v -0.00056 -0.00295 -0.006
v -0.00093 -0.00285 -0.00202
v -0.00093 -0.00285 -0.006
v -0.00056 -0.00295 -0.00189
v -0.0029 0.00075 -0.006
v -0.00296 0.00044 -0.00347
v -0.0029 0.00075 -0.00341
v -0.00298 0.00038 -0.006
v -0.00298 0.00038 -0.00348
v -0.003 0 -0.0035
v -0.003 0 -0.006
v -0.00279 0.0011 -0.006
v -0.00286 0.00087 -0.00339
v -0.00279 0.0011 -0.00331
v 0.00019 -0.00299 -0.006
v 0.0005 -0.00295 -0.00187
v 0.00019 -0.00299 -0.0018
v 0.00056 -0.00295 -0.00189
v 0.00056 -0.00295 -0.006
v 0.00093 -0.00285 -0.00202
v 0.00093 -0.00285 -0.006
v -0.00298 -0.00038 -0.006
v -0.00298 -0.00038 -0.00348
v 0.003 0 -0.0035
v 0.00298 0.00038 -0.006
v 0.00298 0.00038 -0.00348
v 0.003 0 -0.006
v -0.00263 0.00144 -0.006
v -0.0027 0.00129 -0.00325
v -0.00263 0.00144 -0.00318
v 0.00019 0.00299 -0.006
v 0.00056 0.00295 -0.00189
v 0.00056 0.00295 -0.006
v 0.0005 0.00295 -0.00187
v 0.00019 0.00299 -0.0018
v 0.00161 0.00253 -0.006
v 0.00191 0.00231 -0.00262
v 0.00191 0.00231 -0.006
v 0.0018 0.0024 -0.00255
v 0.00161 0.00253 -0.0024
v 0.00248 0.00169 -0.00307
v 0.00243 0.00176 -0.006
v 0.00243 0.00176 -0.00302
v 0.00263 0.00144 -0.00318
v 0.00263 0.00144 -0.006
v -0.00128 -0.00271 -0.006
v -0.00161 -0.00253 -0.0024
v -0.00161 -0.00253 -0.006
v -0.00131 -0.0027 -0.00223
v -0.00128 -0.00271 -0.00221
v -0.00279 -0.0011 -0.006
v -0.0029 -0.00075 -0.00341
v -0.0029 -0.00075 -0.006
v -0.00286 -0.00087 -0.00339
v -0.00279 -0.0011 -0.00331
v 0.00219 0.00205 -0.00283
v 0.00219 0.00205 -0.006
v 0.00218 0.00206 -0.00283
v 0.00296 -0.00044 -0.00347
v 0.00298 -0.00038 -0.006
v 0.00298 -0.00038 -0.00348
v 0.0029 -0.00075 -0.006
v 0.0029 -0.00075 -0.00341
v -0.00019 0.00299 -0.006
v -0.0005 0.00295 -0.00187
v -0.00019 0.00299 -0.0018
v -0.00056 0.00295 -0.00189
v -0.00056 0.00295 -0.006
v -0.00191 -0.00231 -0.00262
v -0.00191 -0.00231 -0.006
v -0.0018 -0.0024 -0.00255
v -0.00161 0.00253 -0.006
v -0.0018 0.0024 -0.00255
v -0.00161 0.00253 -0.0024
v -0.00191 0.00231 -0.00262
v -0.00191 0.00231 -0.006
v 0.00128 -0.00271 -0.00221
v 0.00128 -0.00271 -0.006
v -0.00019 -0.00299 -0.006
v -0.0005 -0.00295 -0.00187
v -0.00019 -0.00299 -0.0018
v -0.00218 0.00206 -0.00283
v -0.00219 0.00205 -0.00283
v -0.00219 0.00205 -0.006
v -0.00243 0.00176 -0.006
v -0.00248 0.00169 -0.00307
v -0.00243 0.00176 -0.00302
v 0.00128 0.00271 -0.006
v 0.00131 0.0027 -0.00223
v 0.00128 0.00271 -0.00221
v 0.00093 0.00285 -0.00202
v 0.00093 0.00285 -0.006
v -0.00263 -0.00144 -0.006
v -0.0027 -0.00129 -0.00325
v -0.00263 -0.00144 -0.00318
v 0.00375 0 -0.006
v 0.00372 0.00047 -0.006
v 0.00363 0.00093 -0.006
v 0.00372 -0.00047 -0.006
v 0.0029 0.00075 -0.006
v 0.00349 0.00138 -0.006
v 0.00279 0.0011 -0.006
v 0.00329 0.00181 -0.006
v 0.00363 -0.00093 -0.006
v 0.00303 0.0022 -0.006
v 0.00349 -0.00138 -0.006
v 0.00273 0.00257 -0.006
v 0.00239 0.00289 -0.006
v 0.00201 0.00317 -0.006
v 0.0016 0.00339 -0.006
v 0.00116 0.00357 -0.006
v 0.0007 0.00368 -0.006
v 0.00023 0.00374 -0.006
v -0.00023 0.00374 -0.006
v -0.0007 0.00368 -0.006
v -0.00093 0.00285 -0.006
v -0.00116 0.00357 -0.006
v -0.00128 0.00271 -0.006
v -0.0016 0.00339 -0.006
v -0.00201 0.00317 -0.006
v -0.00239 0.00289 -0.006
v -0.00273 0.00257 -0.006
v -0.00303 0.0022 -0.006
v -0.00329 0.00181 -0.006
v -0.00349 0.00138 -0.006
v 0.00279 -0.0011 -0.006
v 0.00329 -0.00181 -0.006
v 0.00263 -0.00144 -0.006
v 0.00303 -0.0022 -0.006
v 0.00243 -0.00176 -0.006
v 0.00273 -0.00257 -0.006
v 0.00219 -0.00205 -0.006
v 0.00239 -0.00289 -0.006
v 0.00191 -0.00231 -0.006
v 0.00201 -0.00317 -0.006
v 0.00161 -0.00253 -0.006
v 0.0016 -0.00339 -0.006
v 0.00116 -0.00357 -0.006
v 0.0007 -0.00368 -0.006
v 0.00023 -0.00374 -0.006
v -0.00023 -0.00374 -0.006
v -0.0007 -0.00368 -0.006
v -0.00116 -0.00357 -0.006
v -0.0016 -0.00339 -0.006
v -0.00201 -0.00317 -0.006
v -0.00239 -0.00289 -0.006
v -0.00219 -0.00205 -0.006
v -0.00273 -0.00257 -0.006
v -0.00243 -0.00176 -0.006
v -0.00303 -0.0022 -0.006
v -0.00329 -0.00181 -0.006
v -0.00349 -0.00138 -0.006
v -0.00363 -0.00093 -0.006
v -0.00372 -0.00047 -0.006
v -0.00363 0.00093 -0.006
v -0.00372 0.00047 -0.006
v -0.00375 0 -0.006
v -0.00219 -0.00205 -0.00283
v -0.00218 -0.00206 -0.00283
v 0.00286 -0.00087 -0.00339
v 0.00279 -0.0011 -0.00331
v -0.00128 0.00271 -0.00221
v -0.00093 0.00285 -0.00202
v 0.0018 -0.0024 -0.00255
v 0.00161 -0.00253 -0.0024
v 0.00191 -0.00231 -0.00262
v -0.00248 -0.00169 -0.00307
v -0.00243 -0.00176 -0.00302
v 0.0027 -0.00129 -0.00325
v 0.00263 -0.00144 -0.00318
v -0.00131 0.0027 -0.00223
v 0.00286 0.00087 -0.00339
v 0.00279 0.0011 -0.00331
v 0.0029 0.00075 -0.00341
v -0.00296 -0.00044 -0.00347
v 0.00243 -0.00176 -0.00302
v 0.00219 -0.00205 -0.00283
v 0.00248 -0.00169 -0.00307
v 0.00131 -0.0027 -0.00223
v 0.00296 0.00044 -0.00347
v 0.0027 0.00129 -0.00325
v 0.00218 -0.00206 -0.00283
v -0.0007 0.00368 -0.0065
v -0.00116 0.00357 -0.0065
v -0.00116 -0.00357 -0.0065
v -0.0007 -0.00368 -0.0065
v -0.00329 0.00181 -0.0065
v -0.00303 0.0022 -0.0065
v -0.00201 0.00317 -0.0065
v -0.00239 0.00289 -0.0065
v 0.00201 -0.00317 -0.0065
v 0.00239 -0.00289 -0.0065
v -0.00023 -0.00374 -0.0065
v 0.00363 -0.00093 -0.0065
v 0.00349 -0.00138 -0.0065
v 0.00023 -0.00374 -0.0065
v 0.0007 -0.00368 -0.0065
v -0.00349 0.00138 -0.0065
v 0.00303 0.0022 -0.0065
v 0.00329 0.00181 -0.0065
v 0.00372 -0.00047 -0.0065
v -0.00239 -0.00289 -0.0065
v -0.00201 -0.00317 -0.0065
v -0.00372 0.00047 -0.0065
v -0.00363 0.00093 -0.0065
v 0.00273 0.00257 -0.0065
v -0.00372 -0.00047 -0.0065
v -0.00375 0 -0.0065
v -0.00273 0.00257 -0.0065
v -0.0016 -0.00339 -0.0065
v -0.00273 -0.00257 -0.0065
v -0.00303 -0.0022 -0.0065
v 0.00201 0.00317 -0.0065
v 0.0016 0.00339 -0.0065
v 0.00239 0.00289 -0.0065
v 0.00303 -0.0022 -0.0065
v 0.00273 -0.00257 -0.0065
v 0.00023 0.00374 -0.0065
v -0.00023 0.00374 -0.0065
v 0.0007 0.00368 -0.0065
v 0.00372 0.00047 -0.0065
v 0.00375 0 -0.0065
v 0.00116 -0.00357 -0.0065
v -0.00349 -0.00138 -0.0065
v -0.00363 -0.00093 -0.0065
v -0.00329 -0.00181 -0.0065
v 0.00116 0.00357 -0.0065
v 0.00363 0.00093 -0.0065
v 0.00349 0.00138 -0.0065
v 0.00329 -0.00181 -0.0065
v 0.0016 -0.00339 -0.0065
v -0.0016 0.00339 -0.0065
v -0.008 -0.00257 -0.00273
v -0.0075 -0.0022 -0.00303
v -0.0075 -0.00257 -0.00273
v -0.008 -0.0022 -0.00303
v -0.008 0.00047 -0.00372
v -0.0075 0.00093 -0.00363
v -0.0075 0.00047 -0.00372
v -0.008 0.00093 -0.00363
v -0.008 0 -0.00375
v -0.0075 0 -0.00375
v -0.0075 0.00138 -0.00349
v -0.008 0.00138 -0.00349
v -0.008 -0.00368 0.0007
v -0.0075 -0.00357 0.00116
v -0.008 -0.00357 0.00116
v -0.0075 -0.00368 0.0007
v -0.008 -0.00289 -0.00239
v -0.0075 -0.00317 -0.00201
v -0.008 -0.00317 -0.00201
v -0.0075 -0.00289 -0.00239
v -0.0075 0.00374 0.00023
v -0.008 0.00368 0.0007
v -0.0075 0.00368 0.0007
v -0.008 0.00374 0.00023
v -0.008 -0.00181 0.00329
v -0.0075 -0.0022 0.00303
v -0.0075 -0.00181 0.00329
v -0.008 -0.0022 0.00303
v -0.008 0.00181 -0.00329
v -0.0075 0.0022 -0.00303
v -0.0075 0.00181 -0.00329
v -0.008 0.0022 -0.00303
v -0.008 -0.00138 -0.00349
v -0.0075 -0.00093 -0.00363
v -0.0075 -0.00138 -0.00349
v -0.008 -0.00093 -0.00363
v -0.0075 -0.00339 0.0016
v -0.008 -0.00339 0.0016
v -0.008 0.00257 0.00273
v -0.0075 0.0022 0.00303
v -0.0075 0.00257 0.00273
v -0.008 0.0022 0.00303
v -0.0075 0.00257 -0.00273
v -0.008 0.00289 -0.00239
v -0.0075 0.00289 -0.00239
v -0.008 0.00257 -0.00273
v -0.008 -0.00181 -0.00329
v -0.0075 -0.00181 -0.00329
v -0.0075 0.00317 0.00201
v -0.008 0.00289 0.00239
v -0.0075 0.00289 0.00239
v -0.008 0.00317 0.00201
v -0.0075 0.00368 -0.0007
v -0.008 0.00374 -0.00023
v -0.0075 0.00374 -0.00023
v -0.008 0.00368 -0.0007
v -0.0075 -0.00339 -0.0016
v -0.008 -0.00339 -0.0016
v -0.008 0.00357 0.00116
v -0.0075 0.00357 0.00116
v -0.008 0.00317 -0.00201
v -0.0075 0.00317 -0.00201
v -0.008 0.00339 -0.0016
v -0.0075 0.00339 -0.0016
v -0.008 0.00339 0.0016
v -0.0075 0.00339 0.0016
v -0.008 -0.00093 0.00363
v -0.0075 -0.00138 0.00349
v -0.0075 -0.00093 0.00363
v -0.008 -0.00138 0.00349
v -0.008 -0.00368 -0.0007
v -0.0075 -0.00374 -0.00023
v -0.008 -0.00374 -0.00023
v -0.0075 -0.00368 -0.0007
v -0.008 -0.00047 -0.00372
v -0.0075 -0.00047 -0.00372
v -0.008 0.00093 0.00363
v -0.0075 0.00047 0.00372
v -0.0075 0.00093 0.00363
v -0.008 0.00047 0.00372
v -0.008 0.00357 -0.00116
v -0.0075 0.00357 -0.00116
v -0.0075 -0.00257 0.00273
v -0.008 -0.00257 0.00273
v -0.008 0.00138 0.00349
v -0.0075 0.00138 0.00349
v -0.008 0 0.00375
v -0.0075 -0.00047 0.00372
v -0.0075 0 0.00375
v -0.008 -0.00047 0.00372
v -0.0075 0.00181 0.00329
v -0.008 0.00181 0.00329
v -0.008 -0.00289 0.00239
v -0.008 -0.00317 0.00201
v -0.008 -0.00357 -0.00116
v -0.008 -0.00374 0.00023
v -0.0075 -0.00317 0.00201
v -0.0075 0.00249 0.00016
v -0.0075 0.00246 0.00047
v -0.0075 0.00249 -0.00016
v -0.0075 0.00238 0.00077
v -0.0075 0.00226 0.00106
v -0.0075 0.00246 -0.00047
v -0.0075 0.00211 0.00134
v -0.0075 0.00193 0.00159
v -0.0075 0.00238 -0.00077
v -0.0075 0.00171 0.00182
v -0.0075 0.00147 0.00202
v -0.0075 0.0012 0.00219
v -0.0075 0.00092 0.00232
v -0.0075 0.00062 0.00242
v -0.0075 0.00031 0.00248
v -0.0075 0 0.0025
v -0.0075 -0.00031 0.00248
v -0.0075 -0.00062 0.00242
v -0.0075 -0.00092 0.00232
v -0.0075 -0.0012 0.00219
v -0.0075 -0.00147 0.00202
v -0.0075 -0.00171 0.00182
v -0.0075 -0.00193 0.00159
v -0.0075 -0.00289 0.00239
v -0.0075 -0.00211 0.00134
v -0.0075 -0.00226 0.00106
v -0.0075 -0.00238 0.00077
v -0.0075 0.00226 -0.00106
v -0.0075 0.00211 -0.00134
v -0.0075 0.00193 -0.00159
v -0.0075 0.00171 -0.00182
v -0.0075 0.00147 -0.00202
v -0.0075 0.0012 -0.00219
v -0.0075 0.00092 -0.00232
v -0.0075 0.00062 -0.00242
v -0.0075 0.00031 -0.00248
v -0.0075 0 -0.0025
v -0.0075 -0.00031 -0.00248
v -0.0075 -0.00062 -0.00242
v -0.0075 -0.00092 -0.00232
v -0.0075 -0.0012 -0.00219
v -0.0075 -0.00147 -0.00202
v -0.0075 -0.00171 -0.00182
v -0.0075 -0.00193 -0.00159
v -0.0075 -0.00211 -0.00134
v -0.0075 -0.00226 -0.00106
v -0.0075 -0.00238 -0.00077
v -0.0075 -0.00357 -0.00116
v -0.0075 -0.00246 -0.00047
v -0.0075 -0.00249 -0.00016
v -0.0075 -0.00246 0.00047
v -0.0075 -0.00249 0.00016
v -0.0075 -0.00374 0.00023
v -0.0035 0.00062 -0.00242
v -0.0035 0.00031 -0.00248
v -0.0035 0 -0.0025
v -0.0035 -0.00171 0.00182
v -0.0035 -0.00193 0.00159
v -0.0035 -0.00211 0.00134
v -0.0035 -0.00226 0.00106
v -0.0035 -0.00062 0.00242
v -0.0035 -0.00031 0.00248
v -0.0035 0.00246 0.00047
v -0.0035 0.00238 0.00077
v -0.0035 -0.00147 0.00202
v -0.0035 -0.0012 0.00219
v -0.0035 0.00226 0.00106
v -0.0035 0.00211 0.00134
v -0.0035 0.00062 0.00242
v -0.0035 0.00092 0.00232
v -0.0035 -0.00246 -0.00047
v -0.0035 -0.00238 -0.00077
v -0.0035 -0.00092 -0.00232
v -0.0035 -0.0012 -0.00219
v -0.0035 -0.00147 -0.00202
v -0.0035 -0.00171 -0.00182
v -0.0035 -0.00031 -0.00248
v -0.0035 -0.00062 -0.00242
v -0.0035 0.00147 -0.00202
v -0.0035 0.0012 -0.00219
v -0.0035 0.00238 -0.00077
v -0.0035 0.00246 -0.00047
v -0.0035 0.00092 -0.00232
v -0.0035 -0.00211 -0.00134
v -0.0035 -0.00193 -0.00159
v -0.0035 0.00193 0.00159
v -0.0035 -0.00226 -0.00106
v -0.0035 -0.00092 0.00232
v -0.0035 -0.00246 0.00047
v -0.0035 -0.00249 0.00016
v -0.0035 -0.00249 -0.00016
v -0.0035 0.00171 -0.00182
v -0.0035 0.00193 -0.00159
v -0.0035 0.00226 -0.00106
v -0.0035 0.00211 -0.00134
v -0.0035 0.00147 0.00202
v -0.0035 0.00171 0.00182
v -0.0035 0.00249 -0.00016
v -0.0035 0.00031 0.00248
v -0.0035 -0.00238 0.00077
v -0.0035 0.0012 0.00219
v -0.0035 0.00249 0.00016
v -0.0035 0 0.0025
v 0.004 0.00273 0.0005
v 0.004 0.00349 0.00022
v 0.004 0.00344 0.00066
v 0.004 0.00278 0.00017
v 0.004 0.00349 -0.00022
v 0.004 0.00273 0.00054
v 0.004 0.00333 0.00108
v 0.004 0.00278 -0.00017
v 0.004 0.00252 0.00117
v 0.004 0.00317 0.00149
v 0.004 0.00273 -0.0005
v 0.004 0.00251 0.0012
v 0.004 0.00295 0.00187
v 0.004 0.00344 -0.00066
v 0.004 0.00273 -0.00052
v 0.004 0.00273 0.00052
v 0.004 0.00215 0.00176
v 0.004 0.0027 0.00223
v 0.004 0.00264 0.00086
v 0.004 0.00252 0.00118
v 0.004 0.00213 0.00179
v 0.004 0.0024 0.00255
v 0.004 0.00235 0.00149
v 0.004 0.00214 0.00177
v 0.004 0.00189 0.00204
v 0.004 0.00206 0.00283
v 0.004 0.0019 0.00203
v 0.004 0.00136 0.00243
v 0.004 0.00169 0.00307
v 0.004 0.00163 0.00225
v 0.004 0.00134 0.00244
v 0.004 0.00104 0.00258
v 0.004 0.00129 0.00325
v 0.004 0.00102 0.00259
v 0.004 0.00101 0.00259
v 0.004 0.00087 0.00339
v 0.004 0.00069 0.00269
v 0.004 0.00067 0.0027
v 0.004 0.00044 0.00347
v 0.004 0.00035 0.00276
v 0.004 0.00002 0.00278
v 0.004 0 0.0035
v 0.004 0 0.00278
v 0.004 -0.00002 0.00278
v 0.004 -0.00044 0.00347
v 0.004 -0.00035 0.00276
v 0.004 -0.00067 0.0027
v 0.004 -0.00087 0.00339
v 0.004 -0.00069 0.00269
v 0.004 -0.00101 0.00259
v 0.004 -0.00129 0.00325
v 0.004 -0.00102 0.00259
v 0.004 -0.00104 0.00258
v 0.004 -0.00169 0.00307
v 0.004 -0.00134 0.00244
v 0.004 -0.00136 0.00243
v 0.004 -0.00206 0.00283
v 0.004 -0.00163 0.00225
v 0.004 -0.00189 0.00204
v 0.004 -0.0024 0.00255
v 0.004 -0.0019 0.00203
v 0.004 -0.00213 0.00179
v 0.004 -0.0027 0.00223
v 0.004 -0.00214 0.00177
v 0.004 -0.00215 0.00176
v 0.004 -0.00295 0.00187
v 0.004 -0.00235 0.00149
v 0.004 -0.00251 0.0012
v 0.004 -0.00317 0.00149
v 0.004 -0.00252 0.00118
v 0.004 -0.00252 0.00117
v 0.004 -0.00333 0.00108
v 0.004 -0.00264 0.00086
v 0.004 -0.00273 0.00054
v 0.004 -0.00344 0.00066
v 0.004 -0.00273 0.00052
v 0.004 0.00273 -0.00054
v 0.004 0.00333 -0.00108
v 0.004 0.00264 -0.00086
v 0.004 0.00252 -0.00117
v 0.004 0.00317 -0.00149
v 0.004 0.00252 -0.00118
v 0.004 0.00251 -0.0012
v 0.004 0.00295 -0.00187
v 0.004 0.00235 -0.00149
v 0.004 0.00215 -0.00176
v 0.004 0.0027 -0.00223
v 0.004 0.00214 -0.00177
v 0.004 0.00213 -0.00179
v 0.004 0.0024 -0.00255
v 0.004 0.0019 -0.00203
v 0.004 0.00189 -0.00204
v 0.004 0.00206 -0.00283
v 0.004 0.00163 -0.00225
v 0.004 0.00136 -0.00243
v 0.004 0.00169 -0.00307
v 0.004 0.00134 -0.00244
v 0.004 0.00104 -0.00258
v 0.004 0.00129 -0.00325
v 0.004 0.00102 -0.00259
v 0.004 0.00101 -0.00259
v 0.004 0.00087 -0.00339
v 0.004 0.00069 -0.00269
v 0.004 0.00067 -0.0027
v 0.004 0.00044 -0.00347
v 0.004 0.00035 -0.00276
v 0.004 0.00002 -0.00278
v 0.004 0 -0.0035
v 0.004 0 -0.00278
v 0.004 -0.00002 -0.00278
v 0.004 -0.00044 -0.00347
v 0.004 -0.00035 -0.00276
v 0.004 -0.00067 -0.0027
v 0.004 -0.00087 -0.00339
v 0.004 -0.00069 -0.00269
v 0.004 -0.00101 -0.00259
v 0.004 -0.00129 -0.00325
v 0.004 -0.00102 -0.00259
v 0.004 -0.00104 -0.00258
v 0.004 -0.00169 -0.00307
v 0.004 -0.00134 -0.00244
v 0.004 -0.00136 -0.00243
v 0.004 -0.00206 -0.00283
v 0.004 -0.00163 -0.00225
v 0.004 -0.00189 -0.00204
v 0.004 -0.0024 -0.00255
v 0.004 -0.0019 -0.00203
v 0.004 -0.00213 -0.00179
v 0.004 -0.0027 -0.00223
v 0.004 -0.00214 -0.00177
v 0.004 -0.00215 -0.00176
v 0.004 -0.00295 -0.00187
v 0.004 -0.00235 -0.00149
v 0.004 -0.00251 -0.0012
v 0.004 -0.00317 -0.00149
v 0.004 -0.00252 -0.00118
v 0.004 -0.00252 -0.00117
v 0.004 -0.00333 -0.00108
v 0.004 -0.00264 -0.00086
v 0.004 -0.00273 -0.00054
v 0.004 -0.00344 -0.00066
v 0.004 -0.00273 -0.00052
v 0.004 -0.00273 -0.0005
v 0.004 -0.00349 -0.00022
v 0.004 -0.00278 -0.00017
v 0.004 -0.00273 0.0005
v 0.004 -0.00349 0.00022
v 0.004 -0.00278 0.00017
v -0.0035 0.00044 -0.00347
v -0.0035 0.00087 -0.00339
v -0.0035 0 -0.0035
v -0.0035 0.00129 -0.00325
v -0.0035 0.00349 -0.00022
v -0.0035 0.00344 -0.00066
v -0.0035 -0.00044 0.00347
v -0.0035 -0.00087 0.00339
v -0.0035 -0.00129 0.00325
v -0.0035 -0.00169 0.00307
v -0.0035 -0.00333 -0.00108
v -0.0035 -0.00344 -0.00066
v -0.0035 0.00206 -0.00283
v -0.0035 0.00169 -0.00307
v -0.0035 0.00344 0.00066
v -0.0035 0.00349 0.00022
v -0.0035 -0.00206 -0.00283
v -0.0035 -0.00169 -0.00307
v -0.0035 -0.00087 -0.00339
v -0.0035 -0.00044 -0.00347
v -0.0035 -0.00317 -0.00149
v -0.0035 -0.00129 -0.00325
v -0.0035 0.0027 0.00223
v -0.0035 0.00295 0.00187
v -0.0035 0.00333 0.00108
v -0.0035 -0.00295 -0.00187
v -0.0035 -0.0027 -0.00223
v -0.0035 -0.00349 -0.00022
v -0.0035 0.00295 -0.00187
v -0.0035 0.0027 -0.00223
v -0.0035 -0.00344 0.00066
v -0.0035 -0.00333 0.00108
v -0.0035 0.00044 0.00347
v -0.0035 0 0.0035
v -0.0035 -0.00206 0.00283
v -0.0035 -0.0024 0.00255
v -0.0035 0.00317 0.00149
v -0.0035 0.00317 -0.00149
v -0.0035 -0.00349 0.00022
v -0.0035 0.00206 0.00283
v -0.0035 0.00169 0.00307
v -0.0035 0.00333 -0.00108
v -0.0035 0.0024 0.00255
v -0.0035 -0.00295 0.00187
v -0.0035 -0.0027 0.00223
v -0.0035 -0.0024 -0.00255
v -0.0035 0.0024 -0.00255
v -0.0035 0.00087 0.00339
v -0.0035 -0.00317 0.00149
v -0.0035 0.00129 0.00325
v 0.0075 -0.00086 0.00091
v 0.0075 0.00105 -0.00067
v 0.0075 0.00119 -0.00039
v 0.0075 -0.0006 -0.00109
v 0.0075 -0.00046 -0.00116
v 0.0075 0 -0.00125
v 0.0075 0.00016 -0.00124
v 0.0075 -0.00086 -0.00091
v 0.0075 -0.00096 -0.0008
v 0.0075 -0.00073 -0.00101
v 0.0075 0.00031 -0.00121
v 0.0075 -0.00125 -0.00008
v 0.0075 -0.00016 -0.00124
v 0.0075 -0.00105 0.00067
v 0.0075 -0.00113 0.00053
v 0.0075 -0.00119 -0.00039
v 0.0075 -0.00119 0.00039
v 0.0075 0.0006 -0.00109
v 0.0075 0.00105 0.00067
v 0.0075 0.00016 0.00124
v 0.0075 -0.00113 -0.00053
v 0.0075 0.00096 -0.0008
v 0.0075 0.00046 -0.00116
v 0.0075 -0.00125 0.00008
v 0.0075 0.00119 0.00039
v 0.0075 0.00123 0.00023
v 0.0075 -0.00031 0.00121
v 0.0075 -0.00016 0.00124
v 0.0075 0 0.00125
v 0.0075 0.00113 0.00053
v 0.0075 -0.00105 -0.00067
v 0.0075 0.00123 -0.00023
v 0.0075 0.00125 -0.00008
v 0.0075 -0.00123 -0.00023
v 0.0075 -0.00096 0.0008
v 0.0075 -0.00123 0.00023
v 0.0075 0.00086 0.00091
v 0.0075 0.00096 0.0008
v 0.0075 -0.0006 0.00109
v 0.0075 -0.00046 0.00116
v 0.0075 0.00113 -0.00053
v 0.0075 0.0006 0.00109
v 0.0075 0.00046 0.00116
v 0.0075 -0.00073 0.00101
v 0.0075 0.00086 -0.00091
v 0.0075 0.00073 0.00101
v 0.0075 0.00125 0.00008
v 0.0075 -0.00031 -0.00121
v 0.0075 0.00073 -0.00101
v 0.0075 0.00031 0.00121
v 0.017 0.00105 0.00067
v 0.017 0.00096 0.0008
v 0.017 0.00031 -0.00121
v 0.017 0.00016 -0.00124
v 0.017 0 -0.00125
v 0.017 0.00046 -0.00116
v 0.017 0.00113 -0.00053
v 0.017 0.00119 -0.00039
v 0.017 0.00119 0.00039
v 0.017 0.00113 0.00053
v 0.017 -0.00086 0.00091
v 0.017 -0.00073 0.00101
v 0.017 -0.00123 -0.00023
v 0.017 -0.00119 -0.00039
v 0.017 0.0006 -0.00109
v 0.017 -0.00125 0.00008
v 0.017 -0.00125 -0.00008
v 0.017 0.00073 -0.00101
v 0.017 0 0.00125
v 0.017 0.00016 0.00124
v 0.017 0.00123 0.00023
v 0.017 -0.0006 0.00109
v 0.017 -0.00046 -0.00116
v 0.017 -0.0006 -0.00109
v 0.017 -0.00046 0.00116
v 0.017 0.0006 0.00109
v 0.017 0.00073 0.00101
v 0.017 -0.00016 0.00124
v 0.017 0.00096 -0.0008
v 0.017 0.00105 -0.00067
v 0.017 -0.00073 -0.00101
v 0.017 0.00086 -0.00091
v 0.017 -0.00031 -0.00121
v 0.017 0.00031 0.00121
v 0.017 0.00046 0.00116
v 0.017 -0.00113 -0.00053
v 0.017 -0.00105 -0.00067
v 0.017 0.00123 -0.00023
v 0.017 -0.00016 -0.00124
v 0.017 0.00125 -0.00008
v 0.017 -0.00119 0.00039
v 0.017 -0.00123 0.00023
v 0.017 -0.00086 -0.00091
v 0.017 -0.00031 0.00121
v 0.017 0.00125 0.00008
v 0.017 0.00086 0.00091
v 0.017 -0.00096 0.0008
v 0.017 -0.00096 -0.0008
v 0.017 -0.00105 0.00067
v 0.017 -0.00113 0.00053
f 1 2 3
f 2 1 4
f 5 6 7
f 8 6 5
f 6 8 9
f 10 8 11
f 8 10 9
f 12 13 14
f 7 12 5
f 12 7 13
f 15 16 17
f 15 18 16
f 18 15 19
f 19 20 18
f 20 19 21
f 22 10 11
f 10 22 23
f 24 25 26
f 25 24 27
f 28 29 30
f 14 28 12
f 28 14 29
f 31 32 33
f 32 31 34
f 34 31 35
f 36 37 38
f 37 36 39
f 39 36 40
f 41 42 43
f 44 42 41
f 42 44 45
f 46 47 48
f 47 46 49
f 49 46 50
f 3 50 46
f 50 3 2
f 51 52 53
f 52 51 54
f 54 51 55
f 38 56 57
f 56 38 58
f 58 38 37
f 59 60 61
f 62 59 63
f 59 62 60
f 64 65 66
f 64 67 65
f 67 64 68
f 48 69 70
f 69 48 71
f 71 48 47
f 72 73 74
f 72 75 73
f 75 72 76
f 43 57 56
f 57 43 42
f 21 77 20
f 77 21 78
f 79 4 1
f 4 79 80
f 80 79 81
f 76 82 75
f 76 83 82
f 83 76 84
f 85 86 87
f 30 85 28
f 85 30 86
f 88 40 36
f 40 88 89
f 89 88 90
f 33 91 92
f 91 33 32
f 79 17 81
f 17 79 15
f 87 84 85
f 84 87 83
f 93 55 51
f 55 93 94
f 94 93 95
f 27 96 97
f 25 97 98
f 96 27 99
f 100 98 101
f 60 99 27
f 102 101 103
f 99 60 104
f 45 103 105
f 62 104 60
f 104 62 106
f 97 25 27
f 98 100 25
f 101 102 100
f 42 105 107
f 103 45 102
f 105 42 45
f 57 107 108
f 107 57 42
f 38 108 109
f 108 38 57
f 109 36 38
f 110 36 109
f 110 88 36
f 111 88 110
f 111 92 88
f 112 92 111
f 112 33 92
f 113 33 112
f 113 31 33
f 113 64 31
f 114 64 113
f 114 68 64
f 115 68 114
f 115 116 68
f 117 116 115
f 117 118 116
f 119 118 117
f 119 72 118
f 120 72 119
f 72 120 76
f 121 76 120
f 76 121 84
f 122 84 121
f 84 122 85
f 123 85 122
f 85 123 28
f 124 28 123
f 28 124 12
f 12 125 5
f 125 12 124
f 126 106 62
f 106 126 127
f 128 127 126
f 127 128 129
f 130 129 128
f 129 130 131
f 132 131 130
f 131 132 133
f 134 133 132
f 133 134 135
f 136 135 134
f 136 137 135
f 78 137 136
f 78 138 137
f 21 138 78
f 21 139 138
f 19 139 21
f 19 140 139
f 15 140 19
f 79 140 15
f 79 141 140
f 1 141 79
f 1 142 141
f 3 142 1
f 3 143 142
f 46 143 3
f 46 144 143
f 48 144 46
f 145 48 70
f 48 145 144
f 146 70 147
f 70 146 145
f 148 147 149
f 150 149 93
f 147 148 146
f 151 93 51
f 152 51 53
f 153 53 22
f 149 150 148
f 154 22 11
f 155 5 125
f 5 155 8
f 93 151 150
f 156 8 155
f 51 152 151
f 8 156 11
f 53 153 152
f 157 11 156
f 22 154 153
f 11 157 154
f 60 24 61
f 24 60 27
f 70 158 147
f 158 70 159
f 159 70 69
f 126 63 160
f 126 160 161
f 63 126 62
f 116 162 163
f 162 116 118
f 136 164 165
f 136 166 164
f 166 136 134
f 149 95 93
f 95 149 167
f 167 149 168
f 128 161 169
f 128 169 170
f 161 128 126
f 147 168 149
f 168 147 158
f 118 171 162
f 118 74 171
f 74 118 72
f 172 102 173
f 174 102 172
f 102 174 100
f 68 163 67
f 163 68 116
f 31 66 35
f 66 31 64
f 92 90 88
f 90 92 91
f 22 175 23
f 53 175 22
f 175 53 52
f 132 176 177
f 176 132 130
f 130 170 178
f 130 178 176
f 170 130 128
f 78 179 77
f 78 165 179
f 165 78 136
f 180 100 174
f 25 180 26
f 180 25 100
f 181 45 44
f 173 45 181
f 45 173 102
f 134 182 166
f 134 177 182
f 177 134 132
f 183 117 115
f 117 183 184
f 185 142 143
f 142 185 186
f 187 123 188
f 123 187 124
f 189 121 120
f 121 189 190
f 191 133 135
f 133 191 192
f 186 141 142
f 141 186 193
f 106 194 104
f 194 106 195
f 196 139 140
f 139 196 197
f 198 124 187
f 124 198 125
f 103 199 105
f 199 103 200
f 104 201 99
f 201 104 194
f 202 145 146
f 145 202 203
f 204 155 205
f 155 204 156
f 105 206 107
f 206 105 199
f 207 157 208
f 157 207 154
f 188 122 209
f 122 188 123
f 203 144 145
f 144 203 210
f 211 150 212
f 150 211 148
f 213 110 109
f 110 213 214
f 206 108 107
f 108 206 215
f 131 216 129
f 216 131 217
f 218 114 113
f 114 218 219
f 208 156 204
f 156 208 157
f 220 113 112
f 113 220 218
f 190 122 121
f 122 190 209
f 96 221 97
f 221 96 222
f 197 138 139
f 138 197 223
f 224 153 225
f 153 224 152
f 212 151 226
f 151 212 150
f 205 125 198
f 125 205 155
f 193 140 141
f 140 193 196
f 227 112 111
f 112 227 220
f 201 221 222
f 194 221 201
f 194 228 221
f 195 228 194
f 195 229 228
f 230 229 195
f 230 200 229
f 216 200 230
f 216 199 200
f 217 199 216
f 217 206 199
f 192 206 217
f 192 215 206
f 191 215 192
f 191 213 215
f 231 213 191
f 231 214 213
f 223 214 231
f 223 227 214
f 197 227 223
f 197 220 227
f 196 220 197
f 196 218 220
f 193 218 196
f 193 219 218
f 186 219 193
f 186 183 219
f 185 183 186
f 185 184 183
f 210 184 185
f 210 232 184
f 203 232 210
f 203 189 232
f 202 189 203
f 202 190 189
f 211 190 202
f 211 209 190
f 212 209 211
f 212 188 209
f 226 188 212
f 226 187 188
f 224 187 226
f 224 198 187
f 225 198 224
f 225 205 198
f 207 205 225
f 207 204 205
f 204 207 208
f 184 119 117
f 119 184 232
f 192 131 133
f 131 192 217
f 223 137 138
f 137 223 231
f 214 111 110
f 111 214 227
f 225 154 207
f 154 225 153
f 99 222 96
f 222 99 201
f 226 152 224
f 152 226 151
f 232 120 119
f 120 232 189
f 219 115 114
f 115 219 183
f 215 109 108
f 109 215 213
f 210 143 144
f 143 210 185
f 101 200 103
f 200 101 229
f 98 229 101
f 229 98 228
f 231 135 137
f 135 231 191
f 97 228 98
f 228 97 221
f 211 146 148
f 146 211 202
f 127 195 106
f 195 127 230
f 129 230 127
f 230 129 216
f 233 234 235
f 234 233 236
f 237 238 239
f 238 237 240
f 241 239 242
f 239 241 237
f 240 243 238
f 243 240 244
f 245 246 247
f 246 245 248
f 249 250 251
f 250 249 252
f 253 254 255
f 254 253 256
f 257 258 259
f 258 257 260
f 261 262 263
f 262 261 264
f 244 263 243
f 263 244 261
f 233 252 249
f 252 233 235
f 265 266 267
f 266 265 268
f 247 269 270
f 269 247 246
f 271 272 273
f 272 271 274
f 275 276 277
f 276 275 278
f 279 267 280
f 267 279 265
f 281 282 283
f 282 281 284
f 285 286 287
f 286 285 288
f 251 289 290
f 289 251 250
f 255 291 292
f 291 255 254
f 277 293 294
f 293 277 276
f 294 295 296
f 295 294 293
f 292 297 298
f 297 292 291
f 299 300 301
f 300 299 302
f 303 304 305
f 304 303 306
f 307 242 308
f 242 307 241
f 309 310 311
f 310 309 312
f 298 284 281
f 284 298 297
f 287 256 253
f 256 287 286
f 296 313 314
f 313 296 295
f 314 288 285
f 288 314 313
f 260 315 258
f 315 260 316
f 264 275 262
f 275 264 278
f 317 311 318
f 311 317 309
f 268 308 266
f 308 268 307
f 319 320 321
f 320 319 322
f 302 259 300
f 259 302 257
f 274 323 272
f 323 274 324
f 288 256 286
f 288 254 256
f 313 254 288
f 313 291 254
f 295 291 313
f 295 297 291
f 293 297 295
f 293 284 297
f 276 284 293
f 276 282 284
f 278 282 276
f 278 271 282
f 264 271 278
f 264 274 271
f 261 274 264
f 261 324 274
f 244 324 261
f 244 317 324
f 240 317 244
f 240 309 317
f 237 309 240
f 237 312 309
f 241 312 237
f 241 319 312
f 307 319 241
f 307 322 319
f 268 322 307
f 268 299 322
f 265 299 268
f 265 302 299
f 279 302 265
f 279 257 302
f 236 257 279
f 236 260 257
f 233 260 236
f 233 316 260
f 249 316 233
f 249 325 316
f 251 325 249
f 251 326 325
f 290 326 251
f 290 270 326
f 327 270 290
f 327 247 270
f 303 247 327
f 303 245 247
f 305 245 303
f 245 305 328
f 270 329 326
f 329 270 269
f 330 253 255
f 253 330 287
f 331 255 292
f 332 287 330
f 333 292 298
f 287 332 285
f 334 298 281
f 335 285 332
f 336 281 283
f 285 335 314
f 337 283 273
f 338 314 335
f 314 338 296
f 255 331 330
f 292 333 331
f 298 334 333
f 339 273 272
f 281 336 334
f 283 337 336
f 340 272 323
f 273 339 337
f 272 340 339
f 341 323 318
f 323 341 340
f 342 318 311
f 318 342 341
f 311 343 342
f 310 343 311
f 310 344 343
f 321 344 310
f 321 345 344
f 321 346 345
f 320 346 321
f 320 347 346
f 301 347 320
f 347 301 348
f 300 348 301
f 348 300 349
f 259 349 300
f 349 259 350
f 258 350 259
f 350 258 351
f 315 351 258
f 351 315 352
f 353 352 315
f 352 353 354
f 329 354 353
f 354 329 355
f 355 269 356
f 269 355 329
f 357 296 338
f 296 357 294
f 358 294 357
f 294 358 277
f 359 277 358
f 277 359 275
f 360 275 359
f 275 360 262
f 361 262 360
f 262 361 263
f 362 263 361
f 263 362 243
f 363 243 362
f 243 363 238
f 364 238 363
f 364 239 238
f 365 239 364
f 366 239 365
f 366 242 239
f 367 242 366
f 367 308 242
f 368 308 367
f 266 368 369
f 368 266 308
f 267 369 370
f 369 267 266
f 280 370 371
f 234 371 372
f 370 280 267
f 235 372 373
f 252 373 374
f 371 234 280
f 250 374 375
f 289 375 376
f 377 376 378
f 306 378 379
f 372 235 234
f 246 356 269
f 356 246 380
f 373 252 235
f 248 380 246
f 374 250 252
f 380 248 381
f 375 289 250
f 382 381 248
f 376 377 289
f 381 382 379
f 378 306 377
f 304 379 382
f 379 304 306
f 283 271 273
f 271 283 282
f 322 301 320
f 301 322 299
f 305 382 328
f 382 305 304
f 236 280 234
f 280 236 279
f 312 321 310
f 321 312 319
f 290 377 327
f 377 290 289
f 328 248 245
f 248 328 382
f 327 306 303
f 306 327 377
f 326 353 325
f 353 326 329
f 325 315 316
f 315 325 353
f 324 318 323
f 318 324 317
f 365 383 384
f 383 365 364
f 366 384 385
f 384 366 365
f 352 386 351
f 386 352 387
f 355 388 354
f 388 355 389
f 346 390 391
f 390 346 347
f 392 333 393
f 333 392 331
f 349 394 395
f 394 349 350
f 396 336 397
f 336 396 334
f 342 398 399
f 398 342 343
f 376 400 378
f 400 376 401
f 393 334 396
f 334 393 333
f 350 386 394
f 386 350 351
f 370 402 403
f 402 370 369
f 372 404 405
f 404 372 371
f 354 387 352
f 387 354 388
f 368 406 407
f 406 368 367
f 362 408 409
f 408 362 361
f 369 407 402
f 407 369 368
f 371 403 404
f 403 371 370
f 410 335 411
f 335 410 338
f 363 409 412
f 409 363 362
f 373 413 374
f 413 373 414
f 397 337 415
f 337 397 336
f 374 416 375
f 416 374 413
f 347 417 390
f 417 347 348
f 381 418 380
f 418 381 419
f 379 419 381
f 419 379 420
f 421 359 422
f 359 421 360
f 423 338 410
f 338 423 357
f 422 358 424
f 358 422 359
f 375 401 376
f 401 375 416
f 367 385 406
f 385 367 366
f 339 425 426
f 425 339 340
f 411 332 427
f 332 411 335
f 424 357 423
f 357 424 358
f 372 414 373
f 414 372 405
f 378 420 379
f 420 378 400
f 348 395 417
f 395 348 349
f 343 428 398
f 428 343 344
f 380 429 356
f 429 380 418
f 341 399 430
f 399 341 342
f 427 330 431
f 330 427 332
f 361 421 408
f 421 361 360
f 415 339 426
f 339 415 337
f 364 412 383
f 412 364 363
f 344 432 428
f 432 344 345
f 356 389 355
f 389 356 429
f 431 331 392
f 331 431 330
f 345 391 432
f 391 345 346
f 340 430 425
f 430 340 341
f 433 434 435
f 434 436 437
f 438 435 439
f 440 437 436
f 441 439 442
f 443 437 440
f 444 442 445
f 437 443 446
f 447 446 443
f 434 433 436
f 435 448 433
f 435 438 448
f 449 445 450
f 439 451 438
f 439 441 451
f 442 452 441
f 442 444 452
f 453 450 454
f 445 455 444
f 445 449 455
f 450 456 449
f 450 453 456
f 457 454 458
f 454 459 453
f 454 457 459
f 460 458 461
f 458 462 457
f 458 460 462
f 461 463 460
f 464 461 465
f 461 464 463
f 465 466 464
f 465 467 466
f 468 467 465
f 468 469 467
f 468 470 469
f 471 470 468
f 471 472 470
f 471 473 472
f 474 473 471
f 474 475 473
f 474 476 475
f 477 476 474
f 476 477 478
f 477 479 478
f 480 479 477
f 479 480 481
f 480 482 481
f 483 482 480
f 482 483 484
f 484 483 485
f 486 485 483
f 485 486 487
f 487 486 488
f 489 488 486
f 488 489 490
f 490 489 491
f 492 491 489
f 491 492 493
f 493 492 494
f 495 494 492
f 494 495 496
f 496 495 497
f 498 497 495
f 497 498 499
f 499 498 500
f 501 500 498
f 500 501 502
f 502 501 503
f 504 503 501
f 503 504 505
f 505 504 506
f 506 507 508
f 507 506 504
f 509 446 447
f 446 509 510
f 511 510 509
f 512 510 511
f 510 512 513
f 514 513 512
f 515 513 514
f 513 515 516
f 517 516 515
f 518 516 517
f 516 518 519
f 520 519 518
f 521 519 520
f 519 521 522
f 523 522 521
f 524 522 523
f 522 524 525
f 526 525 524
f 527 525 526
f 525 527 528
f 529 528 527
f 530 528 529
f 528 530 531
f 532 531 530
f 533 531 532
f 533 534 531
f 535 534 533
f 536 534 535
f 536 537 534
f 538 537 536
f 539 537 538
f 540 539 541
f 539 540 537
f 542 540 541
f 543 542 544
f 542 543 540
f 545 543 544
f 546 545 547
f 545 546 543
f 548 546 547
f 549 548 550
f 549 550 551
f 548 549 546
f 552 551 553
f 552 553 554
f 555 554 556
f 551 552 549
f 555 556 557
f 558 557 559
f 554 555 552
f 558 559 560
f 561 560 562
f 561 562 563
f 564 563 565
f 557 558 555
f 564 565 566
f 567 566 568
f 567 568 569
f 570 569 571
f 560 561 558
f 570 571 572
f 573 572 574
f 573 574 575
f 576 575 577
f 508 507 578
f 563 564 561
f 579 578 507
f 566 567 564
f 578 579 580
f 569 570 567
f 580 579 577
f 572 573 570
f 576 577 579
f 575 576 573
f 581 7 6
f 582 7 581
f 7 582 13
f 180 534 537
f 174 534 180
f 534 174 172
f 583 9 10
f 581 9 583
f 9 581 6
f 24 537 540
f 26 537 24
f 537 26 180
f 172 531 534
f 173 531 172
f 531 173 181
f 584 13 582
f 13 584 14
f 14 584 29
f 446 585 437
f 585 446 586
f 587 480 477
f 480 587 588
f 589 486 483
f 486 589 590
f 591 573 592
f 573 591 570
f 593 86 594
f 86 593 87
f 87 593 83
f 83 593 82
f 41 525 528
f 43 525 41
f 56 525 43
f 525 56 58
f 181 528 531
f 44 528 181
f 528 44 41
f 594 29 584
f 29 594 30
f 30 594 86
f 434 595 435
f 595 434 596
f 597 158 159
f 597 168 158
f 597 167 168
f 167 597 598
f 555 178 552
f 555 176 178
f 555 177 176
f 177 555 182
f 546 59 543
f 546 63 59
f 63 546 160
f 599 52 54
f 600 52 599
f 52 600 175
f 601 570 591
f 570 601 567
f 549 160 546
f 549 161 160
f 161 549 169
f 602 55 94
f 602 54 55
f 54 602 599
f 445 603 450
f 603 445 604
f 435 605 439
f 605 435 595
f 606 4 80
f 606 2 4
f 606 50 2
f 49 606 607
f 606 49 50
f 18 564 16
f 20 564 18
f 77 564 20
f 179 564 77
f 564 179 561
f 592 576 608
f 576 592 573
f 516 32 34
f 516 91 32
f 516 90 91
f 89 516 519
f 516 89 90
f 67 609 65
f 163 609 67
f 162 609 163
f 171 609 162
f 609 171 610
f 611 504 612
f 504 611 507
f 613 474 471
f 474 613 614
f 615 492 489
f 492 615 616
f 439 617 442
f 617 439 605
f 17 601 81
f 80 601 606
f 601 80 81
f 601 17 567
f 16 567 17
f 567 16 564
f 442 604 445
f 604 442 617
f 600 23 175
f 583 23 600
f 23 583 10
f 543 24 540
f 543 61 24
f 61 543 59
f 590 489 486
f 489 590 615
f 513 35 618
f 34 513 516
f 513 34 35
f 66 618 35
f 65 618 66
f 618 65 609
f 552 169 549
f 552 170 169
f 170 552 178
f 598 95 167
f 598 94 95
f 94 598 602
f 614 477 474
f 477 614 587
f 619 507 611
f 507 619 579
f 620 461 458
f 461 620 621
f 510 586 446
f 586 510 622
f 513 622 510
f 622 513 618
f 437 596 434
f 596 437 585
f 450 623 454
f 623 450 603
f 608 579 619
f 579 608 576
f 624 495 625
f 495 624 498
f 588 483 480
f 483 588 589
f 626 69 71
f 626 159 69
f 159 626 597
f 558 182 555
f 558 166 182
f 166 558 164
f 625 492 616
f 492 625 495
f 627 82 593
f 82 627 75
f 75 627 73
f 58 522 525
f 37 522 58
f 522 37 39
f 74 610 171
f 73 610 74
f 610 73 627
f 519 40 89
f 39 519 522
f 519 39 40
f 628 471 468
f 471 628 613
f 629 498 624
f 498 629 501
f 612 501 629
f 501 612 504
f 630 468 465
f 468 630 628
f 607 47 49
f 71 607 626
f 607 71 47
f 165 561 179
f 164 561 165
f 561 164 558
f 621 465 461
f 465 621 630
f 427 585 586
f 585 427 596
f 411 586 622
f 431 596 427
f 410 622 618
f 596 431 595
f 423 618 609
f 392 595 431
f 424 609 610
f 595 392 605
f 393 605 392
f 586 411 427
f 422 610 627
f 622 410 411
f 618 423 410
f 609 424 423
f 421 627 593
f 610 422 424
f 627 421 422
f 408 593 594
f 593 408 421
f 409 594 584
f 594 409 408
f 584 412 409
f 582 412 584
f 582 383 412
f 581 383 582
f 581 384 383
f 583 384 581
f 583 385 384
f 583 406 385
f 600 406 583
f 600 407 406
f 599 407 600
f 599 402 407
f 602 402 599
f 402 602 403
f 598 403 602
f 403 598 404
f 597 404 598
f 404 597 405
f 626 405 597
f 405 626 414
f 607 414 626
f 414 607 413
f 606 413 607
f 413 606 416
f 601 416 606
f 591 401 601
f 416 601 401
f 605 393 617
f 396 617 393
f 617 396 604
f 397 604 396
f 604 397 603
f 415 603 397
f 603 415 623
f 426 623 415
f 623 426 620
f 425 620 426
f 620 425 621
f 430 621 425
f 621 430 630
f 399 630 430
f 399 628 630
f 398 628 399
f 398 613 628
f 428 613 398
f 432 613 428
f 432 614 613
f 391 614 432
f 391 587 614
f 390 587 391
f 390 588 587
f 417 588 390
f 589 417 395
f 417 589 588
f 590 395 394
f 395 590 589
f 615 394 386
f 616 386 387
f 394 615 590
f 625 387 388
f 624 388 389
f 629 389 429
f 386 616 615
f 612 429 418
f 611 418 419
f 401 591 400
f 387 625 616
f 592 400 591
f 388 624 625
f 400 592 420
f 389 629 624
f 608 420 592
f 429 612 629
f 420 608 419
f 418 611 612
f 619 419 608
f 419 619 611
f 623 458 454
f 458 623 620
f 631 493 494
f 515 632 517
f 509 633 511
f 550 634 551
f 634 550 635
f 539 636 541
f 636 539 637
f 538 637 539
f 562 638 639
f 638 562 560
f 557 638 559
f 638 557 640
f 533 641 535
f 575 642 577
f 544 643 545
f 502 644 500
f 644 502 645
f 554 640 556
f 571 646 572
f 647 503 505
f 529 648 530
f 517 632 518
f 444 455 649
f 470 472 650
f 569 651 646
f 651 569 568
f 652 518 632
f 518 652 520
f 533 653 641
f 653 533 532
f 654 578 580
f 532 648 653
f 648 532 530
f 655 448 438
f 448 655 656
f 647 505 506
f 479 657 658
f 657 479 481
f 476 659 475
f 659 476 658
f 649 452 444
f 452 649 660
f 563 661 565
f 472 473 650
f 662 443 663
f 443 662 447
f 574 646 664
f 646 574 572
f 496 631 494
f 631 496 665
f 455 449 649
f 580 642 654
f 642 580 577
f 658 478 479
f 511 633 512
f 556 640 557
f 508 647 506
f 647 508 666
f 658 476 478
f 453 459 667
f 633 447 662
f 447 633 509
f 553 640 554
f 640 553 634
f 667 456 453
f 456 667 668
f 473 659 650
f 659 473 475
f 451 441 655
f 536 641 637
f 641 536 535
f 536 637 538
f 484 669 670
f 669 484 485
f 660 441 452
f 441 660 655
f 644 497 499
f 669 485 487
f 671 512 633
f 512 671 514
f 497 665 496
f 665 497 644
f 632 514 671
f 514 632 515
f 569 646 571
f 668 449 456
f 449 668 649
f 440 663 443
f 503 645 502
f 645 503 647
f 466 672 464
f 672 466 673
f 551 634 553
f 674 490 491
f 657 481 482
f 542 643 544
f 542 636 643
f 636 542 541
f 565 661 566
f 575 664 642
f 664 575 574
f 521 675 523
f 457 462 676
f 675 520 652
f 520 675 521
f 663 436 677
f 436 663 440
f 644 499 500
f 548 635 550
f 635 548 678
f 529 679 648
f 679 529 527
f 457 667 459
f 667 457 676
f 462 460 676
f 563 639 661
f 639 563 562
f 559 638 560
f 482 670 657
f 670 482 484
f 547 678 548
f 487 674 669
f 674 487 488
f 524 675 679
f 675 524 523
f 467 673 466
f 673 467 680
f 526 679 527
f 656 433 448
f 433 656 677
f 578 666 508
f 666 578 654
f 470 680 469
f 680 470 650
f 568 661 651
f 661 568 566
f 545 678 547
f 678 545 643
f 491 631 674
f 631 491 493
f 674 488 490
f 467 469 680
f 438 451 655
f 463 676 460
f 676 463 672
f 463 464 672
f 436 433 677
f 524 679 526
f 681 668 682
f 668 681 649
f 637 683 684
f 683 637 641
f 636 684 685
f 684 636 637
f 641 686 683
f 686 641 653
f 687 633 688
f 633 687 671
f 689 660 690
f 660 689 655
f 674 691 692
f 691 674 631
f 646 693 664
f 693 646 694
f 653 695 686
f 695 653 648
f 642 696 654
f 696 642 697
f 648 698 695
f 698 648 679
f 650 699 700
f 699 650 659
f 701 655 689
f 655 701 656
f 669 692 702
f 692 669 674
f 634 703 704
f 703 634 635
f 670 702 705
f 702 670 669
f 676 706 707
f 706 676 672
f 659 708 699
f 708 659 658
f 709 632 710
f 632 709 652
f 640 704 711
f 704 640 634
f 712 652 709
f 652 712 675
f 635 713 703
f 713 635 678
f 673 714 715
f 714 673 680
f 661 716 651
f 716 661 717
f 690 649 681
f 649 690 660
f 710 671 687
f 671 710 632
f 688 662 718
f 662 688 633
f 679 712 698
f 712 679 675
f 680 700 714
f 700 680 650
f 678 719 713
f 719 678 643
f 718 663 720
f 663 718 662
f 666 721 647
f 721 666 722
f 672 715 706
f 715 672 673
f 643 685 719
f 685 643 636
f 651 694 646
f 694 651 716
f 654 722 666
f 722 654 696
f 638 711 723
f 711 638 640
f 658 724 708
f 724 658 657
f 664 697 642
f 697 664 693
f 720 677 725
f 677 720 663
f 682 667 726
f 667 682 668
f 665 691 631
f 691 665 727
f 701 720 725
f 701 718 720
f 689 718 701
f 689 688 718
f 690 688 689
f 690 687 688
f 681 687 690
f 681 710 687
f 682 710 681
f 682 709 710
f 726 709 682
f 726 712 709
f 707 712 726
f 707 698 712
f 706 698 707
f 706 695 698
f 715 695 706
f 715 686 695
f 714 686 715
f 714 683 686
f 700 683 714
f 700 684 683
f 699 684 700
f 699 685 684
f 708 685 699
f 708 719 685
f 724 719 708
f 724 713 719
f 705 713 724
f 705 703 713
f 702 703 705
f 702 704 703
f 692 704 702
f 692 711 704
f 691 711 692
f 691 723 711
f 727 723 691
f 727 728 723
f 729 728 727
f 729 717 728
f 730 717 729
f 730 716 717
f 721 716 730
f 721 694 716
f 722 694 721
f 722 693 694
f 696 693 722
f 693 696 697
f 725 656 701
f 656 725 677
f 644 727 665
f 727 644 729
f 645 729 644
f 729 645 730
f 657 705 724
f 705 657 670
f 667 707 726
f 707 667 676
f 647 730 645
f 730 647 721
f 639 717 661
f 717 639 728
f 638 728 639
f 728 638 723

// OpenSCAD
$fn=50;  // REMOVE
LENGTH = 0.1;  // REMOVE
DO = (LENGTH)*0.05; // REMOVE
//rotate([0,-1*90,-1*180])
rotate([0,90,0])
translate([0,0,-(DO)*1.6])
{
    cylinder(h = (DO)*0.1, r =(DO)*1.5/2); // Inlet flange
    cylinder(h = (DO), r =(DO)/2); // Inlet pipe
    translate([0,0,(DO)*0.9]) cylinder(h = (DO)*1.5, r =(DO)*1.4/2); // Main body
    translate([0,0,(DO)*3.2/2]) rotate([0,90,0])
    {
       cylinder(h = (DO)*1.2, r =(DO)*1.2/2);  // Outlet pipe
       translate([0,0,(DO)*1.2]) cylinder(h = (DO)*0.1, r =(DO)*1.5/2); // Outlet flange
    }
    translate([0,0,(DO)*2.3]) cylinder(h = (DO)*0.8, r1 =(DO)*1.2/2, r2=(DO)*0.5/2);
    translate([0,0,(DO)*2]) cylinder(h = (DO)*3, r =(DO)*0.5/2);
}
